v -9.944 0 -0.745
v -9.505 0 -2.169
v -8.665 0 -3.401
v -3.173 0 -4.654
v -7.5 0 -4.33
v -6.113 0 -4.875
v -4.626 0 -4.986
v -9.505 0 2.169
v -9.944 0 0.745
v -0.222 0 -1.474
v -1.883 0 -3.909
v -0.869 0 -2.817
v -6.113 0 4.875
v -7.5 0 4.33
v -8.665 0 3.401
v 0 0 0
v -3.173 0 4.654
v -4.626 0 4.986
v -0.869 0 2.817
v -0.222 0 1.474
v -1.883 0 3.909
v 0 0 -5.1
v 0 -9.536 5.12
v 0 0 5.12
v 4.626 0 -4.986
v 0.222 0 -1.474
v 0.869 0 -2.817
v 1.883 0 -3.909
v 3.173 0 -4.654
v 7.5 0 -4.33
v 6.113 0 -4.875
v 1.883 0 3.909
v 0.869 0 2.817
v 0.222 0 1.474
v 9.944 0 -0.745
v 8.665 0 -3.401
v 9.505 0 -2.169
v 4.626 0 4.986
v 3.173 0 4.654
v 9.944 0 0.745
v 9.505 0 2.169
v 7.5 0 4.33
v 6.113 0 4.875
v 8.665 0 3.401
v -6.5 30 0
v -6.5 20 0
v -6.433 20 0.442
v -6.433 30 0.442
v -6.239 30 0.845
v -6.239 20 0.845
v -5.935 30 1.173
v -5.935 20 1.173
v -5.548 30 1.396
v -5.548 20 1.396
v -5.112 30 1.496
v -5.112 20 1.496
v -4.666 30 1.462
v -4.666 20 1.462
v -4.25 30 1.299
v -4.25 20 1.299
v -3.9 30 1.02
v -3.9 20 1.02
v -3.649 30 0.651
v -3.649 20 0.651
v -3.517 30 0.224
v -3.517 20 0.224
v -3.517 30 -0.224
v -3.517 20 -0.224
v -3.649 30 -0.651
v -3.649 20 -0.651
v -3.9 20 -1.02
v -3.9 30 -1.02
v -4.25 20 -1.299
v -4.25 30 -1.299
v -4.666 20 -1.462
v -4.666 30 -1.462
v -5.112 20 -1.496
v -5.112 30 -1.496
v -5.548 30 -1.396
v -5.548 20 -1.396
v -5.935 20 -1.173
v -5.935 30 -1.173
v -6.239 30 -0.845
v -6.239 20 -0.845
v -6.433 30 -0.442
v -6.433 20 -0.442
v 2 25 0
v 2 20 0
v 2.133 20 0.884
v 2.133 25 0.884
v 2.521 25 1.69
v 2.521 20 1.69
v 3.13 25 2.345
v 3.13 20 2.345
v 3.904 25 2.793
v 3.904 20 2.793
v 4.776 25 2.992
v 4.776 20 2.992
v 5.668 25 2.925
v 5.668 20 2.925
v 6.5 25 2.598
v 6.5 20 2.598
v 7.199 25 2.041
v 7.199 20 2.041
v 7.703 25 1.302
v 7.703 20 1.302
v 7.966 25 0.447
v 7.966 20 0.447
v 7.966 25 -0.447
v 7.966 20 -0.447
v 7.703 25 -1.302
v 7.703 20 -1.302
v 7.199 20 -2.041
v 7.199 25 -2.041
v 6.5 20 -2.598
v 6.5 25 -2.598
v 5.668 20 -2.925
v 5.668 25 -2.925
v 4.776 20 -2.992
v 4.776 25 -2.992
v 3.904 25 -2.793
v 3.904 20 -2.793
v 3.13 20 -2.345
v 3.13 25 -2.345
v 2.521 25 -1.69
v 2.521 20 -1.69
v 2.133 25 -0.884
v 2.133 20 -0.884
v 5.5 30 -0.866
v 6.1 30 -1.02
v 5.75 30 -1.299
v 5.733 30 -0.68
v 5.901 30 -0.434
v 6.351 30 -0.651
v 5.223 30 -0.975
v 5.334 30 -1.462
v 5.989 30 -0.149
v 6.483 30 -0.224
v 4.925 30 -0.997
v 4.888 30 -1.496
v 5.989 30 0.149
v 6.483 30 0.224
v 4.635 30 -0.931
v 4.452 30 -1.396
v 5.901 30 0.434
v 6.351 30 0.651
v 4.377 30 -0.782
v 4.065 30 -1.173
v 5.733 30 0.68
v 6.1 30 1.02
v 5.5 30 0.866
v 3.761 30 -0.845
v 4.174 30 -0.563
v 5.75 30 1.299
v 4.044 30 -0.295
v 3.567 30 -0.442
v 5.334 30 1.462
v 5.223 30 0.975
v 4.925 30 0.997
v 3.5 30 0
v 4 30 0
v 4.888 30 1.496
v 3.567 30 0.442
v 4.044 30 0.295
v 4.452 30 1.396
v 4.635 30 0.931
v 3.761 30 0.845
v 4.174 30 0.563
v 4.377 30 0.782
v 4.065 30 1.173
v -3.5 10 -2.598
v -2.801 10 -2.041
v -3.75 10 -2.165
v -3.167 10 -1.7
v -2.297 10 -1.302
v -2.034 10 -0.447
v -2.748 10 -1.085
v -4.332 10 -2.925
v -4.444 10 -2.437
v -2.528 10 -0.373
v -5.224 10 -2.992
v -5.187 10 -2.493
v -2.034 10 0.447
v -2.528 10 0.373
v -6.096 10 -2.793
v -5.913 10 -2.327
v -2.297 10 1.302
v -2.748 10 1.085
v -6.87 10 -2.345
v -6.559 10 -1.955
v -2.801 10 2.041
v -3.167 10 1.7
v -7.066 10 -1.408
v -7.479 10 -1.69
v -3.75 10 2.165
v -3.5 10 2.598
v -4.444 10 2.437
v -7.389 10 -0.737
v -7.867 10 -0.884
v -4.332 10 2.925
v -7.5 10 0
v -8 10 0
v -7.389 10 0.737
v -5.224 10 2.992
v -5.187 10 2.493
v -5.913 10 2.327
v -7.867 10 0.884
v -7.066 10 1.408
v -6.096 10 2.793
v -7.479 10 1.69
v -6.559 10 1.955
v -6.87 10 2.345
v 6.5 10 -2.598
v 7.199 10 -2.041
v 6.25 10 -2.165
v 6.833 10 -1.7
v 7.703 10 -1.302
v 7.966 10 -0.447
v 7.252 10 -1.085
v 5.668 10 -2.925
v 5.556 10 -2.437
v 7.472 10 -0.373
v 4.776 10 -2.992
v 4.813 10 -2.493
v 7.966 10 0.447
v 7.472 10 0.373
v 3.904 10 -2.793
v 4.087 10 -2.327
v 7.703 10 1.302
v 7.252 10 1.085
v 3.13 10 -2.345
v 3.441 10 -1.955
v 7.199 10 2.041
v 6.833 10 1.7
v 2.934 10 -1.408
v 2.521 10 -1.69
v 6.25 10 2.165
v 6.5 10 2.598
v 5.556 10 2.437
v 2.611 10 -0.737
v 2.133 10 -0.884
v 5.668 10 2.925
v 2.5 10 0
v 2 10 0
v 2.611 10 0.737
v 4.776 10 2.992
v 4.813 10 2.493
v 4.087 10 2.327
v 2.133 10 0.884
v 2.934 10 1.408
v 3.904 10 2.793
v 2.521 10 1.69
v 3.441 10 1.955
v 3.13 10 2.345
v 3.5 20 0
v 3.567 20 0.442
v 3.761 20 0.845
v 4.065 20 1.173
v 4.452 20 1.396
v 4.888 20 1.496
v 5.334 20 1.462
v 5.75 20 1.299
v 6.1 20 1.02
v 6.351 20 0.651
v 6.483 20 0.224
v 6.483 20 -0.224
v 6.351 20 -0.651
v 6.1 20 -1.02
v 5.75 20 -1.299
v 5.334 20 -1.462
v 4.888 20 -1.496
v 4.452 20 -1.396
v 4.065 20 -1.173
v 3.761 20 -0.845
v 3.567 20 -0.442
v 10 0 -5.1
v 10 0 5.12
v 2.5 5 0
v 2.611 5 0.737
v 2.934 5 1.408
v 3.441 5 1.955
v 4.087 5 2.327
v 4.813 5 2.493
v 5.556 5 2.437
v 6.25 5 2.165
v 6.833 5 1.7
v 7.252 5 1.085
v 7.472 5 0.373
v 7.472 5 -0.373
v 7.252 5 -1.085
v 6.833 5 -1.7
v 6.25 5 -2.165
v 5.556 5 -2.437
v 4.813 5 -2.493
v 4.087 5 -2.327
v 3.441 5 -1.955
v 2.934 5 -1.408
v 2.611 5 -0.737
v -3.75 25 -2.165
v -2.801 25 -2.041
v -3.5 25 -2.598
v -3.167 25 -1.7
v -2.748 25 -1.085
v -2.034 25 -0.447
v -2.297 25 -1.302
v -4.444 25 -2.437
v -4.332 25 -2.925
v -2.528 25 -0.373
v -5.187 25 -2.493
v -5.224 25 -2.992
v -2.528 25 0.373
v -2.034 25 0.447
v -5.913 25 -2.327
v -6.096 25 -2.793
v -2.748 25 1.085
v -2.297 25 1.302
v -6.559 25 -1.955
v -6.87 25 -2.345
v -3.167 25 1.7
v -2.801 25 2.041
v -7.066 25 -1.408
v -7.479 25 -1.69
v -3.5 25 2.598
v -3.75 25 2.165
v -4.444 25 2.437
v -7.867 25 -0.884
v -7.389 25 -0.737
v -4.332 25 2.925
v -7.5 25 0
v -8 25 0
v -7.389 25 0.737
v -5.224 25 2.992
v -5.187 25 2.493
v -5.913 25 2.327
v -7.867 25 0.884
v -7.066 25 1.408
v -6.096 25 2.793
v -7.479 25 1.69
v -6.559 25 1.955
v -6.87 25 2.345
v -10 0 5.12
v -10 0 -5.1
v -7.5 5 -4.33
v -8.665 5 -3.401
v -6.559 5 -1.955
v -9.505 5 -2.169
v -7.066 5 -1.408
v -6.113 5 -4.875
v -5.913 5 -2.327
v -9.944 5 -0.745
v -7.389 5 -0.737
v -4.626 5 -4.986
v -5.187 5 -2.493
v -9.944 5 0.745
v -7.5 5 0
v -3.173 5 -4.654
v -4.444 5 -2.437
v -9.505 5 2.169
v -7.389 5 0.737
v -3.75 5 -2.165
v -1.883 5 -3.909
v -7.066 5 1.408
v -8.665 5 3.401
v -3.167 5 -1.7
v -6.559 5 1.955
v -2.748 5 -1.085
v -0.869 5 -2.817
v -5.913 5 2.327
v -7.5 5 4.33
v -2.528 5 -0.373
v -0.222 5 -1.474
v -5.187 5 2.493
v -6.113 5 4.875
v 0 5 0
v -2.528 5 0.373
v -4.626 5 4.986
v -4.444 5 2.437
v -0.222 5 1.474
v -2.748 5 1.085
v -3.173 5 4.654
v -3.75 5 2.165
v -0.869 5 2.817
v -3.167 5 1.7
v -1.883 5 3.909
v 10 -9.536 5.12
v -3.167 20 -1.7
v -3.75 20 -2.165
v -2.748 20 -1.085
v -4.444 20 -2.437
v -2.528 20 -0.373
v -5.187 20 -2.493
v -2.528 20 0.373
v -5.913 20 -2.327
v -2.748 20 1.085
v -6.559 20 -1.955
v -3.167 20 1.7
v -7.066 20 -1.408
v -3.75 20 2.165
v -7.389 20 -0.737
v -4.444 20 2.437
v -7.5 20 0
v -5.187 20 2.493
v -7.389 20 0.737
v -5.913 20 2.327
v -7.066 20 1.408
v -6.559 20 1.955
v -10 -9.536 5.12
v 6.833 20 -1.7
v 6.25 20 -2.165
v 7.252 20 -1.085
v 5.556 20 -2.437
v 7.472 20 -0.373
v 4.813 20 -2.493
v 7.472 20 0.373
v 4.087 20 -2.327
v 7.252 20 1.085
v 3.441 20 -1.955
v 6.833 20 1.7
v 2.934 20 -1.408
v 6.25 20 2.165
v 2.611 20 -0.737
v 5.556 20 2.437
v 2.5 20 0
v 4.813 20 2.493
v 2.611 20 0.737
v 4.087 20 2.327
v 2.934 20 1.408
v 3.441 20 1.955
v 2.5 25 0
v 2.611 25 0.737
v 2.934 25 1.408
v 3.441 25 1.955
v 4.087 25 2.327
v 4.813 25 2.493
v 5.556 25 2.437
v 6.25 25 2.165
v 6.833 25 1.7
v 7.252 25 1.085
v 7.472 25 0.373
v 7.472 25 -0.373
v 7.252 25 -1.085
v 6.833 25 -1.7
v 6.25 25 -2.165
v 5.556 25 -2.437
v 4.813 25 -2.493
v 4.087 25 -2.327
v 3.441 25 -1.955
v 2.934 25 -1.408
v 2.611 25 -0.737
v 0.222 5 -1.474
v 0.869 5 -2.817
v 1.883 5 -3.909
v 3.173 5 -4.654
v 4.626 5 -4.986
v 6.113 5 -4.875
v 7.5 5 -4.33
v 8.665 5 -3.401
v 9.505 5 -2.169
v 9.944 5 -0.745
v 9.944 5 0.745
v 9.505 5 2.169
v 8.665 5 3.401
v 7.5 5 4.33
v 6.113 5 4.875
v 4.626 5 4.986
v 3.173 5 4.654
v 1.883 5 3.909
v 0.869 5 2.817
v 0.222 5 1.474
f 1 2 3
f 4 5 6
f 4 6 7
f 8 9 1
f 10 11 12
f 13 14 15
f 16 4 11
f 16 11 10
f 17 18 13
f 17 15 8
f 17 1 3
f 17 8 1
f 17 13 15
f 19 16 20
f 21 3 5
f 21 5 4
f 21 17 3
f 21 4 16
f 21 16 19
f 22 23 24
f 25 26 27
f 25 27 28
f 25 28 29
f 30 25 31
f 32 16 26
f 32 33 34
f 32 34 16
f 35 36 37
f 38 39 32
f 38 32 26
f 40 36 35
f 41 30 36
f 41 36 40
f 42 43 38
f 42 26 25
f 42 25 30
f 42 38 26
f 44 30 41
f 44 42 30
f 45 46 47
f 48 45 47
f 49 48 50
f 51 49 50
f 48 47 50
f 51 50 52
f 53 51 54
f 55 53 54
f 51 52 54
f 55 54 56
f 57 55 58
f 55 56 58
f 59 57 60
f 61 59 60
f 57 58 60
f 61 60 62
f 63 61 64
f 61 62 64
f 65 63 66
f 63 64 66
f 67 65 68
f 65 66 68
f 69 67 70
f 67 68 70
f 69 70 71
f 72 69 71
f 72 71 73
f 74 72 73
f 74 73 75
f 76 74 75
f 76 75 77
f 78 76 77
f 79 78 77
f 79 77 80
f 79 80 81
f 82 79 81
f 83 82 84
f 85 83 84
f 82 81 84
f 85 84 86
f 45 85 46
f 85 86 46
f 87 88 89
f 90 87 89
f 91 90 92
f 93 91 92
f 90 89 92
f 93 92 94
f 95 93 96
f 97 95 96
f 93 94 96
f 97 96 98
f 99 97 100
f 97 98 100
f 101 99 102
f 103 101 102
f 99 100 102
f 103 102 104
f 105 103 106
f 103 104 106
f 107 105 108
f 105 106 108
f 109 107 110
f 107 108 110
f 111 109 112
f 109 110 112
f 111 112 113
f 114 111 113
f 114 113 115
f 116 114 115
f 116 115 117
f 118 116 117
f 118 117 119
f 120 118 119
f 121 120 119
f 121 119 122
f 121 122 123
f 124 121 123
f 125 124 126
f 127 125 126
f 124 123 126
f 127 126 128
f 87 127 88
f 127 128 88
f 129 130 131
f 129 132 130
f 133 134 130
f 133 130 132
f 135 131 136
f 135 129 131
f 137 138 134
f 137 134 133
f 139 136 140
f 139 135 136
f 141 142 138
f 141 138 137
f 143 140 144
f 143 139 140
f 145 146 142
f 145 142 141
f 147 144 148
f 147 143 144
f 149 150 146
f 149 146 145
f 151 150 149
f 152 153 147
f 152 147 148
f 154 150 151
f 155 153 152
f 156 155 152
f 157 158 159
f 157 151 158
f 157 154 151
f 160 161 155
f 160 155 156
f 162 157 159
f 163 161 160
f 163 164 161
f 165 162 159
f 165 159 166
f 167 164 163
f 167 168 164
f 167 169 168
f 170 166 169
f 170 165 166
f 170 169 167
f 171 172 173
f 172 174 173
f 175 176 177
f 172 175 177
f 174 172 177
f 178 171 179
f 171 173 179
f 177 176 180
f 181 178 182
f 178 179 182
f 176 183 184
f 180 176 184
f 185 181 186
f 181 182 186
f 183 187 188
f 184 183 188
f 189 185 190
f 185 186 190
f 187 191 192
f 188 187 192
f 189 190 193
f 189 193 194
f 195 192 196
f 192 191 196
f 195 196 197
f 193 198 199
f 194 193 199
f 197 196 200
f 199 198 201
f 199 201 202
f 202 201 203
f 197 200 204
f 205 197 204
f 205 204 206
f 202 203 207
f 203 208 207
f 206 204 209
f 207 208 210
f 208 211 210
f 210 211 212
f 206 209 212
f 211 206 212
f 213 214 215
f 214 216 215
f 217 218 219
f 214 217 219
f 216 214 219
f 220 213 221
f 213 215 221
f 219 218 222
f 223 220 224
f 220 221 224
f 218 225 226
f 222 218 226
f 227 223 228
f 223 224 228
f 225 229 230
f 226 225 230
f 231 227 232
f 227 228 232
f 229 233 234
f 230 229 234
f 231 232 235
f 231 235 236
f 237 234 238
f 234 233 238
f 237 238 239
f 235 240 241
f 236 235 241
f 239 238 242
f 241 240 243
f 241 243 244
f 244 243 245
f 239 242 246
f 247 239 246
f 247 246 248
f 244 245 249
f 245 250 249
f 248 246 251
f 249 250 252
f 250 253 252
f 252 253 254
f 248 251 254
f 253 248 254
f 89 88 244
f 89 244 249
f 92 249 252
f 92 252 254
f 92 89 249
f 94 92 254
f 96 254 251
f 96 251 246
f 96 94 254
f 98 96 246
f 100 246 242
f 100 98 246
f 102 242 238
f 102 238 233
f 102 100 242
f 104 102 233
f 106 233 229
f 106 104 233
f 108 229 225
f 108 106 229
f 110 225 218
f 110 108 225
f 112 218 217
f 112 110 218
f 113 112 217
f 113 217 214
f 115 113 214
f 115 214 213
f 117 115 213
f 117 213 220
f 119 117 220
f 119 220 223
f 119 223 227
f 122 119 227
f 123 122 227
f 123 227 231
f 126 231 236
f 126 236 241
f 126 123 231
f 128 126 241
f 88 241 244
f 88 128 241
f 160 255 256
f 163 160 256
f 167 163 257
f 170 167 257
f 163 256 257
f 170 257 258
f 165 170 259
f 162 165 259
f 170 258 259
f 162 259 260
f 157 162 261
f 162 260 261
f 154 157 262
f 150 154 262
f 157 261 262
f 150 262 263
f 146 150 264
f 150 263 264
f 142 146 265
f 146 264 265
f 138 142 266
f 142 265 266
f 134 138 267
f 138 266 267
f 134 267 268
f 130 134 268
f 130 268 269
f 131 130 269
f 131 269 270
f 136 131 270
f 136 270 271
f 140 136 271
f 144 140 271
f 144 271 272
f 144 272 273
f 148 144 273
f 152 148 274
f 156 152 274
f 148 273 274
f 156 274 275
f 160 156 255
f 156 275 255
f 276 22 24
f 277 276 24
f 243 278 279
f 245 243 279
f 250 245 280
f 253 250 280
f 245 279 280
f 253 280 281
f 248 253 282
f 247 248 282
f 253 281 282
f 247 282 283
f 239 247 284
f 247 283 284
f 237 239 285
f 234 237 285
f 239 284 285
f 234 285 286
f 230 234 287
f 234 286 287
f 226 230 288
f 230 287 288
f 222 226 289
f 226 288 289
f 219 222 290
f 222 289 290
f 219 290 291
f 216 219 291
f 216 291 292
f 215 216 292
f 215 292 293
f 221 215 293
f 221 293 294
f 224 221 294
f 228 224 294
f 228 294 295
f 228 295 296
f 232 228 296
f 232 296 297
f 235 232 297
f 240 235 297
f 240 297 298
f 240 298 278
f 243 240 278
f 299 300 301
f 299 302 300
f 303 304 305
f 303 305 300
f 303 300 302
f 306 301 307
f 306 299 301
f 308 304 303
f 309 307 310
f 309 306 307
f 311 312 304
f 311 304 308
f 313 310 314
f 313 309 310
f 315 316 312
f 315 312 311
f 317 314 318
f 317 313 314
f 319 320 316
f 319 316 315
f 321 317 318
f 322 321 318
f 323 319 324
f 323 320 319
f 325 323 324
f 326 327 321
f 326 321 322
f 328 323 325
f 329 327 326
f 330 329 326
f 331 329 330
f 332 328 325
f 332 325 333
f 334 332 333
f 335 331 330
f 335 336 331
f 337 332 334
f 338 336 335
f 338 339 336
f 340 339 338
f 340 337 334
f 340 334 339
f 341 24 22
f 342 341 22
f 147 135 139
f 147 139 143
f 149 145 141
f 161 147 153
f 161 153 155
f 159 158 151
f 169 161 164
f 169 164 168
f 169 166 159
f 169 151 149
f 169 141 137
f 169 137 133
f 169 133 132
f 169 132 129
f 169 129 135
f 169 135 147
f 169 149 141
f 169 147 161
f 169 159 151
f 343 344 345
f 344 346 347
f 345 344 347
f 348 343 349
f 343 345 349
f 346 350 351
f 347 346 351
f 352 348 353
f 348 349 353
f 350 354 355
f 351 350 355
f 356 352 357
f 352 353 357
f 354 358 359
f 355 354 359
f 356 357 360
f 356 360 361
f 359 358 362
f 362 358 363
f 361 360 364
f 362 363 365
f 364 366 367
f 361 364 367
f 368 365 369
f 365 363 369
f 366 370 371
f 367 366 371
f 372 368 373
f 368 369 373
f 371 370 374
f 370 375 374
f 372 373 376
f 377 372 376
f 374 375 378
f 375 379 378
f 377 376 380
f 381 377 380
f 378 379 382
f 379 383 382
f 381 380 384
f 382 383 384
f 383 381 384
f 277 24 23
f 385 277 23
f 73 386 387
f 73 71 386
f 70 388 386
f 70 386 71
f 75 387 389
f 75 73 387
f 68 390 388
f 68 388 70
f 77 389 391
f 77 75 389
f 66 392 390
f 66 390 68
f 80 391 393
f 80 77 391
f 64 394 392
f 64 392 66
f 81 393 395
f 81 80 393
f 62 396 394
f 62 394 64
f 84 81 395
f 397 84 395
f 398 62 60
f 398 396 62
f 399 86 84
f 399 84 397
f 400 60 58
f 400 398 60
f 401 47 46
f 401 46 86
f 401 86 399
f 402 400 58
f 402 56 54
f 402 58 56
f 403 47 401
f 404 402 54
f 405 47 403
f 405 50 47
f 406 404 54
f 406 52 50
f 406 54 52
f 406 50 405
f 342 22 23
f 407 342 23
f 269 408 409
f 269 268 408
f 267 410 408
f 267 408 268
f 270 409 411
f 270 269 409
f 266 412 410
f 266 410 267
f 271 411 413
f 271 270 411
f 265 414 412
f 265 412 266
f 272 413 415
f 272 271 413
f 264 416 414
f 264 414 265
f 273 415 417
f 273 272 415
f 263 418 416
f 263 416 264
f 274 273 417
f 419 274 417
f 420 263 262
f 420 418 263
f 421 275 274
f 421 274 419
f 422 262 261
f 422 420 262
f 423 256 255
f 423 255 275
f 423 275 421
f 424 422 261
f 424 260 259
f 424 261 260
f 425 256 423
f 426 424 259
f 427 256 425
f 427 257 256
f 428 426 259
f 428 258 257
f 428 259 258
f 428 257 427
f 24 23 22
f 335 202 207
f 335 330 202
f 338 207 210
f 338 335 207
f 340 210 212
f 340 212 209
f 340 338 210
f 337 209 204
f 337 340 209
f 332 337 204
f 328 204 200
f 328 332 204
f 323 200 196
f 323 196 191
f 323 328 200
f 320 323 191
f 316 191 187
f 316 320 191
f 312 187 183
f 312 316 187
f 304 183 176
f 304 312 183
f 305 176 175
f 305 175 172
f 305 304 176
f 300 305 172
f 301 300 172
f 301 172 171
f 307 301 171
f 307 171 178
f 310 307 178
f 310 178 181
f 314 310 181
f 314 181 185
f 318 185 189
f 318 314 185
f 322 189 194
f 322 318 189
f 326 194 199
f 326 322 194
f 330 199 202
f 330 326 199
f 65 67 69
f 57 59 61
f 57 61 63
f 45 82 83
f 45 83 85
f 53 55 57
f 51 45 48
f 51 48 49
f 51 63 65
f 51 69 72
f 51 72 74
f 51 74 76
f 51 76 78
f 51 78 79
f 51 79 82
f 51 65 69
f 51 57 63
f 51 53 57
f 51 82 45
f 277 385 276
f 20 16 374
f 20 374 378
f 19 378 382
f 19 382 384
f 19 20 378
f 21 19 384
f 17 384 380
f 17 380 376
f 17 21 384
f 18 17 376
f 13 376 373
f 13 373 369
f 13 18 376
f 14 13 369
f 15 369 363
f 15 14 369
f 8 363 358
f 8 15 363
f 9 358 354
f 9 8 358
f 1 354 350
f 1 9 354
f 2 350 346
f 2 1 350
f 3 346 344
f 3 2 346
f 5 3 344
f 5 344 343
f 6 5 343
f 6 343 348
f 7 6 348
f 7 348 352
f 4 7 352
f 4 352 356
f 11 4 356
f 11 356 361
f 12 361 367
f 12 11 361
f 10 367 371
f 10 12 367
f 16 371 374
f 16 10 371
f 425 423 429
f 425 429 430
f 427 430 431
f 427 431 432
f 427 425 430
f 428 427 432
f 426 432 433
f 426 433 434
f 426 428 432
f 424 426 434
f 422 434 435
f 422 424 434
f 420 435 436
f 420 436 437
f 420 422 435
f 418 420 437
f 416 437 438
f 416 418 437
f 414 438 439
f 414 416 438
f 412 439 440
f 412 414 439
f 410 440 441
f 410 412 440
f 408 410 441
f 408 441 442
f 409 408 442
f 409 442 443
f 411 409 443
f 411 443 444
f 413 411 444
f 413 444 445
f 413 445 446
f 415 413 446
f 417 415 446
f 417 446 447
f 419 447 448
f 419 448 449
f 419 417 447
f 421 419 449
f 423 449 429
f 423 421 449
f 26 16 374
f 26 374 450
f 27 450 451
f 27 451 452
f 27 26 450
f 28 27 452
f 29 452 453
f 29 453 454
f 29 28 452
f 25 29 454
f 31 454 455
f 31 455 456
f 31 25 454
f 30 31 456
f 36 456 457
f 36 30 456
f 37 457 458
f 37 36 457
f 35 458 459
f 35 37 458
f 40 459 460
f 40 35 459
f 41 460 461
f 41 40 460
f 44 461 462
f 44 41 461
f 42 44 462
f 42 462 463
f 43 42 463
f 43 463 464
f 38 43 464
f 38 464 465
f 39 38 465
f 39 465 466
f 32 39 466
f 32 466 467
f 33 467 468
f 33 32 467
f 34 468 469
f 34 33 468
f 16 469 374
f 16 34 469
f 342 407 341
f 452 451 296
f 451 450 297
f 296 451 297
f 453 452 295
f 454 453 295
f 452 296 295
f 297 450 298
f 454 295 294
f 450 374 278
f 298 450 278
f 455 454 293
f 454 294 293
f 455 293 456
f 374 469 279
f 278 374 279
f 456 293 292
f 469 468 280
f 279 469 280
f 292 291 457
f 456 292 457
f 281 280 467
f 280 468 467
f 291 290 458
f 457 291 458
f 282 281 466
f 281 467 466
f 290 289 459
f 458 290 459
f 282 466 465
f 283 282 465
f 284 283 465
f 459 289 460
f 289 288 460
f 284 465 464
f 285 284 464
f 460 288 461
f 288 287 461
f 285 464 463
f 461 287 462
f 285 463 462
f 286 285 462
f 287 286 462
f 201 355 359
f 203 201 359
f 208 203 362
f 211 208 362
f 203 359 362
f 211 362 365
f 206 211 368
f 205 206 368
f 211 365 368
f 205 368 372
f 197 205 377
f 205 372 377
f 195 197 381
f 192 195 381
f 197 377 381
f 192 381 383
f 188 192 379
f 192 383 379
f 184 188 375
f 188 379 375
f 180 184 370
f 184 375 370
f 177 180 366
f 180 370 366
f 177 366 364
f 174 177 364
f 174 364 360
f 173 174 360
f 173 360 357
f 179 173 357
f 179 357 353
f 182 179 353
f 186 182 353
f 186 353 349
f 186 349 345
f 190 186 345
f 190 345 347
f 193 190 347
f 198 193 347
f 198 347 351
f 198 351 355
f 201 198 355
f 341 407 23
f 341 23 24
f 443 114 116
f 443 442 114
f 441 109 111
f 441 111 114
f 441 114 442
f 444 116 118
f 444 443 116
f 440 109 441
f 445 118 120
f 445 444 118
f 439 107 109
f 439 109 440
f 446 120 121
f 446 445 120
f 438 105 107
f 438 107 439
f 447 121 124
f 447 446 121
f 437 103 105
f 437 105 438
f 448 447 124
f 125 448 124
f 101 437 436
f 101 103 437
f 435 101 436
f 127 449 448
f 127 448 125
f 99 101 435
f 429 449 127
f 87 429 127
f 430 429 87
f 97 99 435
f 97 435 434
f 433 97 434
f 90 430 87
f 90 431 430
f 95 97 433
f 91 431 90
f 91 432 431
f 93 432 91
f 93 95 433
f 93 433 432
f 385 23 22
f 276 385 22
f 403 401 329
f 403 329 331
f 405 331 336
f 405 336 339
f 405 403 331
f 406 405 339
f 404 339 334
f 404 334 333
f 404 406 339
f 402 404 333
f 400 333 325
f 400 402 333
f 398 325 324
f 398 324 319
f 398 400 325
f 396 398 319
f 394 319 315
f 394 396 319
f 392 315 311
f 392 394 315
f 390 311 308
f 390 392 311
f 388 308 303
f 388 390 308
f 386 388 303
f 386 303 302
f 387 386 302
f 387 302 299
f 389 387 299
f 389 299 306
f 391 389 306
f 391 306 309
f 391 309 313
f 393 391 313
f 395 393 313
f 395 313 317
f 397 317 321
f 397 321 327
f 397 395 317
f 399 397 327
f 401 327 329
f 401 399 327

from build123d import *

# Parameters (mm, degrees)
F0_R        = 5
F1_DEPTH    = 5
F2_R        = 2.5
F3_DEPTH    = 15
F4_R        = 3
F4_R_2      = 2.5
F5_DEPTH    = 10
F5_FACE_R   = 3
F5_FACE_R_2 = 2.5
F6_DEPTH    = 5
F7_R        = 1.5
F8_DEPTH    = 10
F9_R        = 1
F10_DEPTH   = 10
F11_W       = 10
F11_H       = 10
F12_DEPTH   = 0.1
F13_DEPTH   = 0.1
F16_DEPTH   = 10
F17_DEPTH   = 10


with BuildPart() as f1:
    # F0 (on Front) → F1 (new body)
    with BuildSketch(Plane.XZ):
        with BuildLine():
            ThreePointArc((0, 0), (5, -5), (10, 0))
            ThreePointArc((10, 0), (5, 5), (0, 0))
        make_face()
        with Locations((-5, 0)):
            Circle(F0_R)
    extrude(amount=-F1_DEPTH)

    # F2 (on face) → F3 (join)
    with BuildSketch(Plane(origin=(0, 5, 0), x_dir=(-1, 0, 0), z_dir=(0, 1, 0))):
        with Locations((-5, 0)):
            Circle(F2_R)
        with Locations((5, 0)):
            Circle(F2_R)
    extrude(amount=F3_DEPTH)



with BuildPart() as f5:
    # F4 (on face) → F5 (new body)
    with BuildSketch(Plane(origin=(0, 20, 0), x_dir=(-1, 0, 0), z_dir=(0, 1, 0))):
        with Locations((-5, 0)):
            Circle(F4_R)
        with Locations((-5, 0)):
            Circle(F4_R_2, mode=Mode.SUBTRACT)
        with Locations((5, 0)):
            Circle(F4_R)
        with Locations((5, 0)):
            Circle(F4_R_2, mode=Mode.SUBTRACT)
    extrude(amount=-F5_DEPTH)


with BuildPart() as f1_1:
    add(f1.part)

    add(f5.part)  # F6 merges F5
    # F5_face (on face) → F6 (join)
    with BuildSketch(Plane(origin=(5, 20, 0), x_dir=(-1, 0, 0), z_dir=(0, 1, 0))):
        Circle(F5_FACE_R)
        Circle(F5_FACE_R_2, mode=Mode.SUBTRACT)
        with Locations((10, 0)):
            Circle(F5_FACE_R)
        with Locations((10, 0)):
            Circle(F5_FACE_R_2, mode=Mode.SUBTRACT)
    extrude(amount=F6_DEPTH)

    # F7 (on face) → F8 (join)
    with BuildSketch(Plane(origin=(0, 20, 0), x_dir=(-1, 0, 0), z_dir=(0, 1, 0))):
        with Locations((-5, 0)):
            Circle(F7_R)
        with Locations((5, 0)):
            Circle(F7_R)
    extrude(amount=F8_DEPTH)

    # F9 (on face) → F10 (join)
    with BuildSketch(Plane(origin=(0, 30, 0), x_dir=(-1, 0, 0), z_dir=(0, 1, 0))):
        with Locations((-5, 0)):
            Circle(F9_R)
        with Locations((5, 0)):
            Circle(F9_R)
    extrude(amount=-F10_DEPTH)


with BuildPart() as f12:
    # F11 (on Front) → F12 (new body)
    with BuildSketch(Plane.XZ):
        with Locations((5, 0)):
            Rectangle(F11_W, F11_H)
        with Locations((-5, 0)):
            Rectangle(F11_W, F11_H)
    extrude(amount=F12_DEPTH)


with BuildPart() as f13:
    # F11 (on Front) → F13 (new body)
    with BuildSketch(Plane.XZ):
        with Locations((5, 0)):
            Rectangle(F11_W, F11_H)
        with Locations((-5, 0)):
            Rectangle(F11_W, F11_H)
    extrude(amount=F13_DEPTH)


with BuildPart() as f16:
    # F15 (on Right) → F16 (new body)
    with BuildSketch(Plane.YZ):
        Polygon((0, -5.100443), (0, 5.119788), (-9.536071, 5.119788), align=None)
    extrude(amount=F16_DEPTH)


with BuildPart() as f17:
    # F16_face (on face) → F17 (new body)
    with BuildSketch(Plane(origin=(0, -3.17869, 1.713044), x_dir=(0, 1, 0), z_dir=(-1, 0, 0))):
        Polygon((3.17869, -3.406744), (3.17869, 6.813487), (-6.35738, -3.406744), align=None)
    extrude(amount=F17_DEPTH)


solid = Compound([f1_1.part, f16.part, f17.part])
